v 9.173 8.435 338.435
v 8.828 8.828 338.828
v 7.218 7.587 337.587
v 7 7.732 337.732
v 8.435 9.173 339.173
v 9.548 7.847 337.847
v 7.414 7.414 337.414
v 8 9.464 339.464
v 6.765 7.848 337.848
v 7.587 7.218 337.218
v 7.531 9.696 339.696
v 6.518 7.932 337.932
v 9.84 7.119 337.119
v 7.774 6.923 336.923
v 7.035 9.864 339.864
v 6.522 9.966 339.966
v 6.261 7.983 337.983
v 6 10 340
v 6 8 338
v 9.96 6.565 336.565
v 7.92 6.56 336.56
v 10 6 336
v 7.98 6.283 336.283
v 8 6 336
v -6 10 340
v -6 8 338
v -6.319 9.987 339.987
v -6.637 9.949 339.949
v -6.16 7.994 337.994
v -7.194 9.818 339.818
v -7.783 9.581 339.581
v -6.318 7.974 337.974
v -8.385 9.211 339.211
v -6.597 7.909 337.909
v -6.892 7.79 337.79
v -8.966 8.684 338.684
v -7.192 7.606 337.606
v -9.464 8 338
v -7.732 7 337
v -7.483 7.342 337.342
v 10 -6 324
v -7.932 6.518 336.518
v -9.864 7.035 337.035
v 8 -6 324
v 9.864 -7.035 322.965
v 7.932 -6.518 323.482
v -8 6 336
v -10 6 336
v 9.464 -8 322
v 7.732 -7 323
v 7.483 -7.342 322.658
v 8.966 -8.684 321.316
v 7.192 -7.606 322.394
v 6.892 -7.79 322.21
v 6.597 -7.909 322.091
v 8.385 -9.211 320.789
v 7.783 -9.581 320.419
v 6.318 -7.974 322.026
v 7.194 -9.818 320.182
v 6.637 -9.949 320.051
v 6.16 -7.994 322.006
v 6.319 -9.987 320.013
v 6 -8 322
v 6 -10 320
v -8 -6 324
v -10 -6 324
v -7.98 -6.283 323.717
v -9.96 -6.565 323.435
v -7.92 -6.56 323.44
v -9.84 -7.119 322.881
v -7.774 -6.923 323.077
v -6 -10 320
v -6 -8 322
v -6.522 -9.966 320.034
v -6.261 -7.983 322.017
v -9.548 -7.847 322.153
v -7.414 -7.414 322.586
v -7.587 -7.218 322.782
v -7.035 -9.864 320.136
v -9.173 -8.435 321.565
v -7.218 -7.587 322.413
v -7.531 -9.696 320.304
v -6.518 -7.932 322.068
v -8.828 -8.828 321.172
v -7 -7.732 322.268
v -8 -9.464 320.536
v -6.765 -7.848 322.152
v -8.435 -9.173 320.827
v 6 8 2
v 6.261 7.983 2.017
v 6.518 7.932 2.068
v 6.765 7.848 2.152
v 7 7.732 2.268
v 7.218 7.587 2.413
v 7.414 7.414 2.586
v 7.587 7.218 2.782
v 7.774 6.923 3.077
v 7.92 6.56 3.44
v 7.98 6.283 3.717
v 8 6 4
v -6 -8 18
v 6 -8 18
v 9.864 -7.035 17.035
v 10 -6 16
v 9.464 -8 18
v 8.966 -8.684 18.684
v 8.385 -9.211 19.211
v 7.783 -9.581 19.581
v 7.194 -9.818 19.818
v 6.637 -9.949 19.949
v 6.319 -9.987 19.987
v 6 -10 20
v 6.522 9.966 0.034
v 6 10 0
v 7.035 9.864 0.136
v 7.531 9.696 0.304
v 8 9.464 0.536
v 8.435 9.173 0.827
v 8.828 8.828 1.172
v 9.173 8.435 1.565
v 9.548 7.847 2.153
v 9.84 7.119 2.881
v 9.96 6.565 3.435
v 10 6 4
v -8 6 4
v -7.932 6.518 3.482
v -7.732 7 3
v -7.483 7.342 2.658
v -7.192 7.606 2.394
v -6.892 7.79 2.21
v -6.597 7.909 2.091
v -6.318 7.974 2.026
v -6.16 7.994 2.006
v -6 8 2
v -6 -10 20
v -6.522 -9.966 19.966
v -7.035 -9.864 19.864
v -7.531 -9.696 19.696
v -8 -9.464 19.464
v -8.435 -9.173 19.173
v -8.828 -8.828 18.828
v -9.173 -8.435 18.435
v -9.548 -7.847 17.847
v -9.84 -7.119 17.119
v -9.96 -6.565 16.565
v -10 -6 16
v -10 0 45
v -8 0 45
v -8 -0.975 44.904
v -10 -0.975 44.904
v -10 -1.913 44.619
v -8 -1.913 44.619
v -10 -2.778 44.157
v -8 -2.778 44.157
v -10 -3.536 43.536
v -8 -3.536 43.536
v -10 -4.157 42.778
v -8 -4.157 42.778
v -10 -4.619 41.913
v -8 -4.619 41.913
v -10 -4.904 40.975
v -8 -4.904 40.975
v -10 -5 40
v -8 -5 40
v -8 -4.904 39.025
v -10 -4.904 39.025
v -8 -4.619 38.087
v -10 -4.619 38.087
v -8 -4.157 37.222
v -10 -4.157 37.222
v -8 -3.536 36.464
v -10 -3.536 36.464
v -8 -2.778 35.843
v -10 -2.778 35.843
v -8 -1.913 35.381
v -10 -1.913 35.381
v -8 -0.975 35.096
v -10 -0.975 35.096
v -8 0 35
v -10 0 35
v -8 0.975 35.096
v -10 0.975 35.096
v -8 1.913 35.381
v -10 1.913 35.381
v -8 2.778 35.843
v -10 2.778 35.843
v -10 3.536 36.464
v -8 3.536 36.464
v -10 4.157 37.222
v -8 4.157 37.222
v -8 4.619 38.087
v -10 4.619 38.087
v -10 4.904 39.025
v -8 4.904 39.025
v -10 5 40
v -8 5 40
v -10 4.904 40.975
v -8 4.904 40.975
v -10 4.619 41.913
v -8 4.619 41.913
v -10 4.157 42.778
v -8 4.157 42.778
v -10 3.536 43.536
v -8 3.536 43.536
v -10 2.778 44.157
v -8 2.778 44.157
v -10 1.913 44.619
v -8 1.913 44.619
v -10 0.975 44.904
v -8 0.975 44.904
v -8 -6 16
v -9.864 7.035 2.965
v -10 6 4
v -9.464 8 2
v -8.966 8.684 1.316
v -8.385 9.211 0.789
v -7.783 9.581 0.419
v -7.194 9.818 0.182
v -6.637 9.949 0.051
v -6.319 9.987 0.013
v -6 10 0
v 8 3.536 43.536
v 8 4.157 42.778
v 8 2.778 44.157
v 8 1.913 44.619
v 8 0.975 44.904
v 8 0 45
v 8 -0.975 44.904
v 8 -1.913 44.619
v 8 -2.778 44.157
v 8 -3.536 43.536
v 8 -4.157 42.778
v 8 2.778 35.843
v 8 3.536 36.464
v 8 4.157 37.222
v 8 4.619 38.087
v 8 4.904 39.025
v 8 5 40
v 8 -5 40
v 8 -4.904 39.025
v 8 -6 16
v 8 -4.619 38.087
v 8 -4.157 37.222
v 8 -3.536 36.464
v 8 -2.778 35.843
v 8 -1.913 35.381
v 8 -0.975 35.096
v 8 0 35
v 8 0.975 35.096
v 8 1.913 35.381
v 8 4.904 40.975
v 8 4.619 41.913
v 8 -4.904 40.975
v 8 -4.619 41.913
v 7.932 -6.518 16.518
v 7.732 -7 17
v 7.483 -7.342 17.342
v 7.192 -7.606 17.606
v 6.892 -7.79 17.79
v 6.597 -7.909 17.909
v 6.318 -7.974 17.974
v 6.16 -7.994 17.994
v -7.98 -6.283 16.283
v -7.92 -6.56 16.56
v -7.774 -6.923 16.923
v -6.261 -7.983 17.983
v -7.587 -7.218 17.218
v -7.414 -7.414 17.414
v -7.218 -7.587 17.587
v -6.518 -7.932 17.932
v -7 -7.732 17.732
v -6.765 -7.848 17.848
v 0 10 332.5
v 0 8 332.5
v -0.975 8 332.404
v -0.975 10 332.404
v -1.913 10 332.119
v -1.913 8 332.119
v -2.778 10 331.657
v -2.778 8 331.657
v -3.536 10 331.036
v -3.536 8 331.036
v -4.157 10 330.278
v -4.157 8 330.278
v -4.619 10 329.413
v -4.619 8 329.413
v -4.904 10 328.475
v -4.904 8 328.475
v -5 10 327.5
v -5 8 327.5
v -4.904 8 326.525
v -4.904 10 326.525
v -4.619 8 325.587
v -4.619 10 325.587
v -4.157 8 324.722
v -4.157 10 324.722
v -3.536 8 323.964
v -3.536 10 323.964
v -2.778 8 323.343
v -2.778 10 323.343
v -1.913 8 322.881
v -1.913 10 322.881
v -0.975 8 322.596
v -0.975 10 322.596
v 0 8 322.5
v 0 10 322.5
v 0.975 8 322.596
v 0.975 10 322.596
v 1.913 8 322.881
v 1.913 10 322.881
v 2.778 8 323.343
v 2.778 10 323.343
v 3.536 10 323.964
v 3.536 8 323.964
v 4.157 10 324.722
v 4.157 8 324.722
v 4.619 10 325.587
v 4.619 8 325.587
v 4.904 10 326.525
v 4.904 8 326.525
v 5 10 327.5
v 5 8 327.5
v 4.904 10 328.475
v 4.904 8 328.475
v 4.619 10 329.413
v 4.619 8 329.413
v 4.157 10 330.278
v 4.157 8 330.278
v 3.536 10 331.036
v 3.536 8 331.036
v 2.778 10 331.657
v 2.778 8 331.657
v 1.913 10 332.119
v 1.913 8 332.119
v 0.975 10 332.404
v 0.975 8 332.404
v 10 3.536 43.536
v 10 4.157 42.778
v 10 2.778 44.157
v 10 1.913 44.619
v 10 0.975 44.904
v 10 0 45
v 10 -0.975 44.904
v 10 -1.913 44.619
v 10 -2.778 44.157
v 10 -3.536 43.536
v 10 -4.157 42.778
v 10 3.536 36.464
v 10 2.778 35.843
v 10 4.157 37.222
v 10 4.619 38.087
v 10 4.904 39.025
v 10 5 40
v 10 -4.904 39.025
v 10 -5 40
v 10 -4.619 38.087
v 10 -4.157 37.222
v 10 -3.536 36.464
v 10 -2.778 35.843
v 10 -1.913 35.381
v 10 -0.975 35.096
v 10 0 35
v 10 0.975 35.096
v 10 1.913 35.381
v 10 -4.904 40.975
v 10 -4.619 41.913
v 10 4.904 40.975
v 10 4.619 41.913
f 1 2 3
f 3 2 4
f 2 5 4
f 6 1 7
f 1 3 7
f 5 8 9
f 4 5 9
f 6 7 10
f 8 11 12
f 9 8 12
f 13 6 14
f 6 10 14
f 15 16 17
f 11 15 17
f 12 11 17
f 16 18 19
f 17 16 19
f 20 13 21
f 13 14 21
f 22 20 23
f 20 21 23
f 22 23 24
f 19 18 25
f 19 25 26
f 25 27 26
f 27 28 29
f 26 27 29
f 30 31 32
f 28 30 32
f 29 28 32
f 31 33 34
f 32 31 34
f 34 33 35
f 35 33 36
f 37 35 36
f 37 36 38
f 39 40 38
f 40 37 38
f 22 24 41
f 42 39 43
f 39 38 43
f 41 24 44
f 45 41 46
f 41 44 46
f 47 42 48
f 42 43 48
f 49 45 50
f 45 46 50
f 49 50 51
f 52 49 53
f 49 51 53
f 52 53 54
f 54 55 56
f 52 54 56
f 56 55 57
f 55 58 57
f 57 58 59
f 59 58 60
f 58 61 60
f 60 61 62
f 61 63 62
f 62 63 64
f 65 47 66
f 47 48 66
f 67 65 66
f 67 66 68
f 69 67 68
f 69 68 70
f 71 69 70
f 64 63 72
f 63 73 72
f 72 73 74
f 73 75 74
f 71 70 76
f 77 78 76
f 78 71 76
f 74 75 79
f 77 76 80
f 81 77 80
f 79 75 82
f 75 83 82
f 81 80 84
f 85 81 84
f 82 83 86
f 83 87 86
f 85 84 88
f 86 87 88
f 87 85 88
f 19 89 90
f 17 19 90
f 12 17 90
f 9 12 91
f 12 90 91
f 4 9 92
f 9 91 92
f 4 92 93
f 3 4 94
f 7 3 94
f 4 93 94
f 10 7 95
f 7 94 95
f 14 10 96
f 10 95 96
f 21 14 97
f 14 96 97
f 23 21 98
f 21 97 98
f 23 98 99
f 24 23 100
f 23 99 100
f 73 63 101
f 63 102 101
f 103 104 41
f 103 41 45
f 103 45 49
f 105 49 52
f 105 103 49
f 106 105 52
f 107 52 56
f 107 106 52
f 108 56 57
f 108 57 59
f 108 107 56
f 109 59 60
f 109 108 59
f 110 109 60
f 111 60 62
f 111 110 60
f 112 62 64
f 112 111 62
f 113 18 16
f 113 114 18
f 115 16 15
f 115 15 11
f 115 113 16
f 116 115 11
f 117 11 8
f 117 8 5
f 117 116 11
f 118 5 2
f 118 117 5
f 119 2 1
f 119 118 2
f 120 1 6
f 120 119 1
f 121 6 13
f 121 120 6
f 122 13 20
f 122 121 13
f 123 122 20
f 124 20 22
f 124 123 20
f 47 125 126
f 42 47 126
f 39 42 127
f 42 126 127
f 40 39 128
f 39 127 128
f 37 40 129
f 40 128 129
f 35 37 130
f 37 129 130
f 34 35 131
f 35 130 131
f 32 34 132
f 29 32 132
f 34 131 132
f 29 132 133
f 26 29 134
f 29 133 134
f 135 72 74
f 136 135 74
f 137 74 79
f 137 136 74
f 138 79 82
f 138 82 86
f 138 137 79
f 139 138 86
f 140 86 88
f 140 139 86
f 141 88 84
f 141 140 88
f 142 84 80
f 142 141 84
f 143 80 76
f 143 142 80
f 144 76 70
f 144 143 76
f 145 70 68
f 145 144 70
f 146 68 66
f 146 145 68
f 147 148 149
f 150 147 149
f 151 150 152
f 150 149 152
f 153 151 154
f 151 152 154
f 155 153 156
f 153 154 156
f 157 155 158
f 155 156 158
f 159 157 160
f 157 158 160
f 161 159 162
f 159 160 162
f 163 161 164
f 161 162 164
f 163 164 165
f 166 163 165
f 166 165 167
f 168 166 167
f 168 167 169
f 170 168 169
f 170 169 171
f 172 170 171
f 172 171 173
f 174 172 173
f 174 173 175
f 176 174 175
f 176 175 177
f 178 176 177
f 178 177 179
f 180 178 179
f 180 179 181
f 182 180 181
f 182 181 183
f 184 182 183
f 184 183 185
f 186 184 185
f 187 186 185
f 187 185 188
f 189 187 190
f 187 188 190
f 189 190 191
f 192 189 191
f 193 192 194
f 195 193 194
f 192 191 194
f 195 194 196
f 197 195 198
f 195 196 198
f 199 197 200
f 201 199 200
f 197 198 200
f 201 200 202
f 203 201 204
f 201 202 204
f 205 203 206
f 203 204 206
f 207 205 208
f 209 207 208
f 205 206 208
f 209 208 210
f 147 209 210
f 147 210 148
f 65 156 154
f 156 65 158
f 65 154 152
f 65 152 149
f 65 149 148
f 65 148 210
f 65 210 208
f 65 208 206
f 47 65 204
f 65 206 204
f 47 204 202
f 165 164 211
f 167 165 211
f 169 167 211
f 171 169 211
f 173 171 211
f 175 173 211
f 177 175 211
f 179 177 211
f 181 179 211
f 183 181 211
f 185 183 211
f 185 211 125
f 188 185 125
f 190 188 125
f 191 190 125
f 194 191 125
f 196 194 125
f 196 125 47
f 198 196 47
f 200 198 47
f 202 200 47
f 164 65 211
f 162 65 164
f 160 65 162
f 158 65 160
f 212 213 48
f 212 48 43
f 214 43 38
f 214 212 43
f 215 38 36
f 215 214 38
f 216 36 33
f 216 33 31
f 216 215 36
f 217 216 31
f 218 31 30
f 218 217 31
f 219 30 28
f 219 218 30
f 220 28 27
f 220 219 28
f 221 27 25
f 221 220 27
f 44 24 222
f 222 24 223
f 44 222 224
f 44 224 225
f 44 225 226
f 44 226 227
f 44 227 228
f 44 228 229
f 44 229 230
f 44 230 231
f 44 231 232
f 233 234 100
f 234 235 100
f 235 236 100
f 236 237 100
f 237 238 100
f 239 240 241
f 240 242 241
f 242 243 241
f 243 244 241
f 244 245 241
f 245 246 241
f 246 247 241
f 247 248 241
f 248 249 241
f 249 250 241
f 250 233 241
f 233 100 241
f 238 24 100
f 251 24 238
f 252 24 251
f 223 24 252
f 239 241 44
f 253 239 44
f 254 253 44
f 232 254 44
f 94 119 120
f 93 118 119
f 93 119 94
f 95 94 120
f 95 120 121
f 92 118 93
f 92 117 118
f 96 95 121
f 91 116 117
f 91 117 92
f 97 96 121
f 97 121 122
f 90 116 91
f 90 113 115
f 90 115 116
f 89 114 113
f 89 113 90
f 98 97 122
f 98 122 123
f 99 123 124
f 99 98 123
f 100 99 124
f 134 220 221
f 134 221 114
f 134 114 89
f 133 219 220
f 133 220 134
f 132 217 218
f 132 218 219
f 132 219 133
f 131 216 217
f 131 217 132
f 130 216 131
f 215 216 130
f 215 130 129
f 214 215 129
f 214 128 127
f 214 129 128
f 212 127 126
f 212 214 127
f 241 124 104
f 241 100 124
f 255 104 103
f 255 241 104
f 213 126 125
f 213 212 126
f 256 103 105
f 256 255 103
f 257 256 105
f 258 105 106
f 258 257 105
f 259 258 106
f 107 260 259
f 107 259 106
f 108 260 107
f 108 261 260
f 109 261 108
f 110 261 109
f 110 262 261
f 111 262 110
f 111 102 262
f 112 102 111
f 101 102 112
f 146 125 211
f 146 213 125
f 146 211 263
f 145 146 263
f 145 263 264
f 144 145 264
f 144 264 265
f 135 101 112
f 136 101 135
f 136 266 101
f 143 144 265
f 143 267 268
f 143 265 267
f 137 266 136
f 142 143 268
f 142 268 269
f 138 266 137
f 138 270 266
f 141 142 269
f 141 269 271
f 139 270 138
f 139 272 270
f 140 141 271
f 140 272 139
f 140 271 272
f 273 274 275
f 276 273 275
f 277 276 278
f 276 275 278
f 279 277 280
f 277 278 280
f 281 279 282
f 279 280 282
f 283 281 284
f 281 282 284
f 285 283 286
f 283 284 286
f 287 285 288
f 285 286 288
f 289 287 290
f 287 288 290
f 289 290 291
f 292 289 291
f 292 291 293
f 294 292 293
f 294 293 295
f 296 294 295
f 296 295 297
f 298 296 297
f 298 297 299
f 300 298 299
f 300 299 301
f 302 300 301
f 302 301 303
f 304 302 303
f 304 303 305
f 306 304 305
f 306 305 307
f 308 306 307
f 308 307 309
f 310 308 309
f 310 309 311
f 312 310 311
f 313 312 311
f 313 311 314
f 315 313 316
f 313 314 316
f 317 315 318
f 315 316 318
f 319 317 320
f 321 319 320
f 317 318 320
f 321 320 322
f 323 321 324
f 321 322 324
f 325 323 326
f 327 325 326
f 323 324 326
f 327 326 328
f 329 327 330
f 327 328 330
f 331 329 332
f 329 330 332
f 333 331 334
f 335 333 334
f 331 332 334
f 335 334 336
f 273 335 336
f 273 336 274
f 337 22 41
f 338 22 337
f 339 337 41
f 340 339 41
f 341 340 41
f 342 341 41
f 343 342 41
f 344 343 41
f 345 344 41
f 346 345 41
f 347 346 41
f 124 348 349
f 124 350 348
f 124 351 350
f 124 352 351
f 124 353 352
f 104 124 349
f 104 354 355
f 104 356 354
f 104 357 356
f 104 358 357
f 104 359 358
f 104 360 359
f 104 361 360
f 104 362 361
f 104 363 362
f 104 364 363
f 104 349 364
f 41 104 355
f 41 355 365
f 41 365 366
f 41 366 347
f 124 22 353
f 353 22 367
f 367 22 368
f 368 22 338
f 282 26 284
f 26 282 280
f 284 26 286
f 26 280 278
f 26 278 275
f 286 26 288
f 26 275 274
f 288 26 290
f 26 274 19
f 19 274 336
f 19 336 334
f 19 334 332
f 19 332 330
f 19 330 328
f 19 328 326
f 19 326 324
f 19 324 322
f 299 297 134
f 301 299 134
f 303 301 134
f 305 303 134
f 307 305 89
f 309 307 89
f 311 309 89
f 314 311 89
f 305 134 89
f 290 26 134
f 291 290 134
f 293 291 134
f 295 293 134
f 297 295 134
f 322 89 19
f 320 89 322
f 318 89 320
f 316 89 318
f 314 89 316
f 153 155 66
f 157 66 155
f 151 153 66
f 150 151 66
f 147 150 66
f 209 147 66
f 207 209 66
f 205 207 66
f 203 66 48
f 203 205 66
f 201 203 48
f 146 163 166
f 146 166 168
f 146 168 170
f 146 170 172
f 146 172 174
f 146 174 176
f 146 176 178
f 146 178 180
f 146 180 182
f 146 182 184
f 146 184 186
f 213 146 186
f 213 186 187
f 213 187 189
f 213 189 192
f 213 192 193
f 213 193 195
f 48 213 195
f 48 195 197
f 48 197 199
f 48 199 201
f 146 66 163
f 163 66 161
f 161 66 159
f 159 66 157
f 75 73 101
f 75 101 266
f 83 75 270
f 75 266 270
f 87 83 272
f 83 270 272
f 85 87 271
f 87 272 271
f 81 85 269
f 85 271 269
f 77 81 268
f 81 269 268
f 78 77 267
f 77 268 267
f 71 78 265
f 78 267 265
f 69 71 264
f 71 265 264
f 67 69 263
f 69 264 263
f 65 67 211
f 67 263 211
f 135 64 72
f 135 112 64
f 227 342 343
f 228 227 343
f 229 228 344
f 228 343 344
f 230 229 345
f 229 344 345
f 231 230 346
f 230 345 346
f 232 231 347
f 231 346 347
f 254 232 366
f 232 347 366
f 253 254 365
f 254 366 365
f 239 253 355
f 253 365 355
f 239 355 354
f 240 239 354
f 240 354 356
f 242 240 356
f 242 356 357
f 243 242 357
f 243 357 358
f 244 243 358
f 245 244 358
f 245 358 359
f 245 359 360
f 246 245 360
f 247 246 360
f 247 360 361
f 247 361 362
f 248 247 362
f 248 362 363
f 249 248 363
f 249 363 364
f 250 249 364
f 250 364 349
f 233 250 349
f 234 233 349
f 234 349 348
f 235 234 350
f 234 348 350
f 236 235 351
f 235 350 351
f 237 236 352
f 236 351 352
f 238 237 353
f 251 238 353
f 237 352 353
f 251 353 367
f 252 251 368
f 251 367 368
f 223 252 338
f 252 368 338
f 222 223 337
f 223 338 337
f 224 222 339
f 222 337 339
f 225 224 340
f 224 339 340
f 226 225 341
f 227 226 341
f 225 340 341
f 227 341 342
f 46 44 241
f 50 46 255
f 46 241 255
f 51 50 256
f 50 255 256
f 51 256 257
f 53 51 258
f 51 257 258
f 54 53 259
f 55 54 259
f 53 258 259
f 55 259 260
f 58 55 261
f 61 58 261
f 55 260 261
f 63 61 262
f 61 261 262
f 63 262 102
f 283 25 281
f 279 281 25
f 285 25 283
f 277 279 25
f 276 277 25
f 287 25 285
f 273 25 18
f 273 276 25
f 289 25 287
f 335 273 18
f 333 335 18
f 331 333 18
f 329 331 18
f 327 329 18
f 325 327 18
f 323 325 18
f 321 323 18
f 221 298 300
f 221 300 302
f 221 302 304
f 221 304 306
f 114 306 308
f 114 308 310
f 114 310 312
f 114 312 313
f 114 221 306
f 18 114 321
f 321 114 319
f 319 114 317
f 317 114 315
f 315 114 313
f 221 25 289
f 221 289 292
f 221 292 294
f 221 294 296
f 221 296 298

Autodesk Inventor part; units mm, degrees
ref_plane "YZ Plane" through (0, 0, 0) normal (1, 0, 0) x (0, 1, 0)
ref_plane "Piano iniziale" through (0, 0, 0) normal (0, 0, 1) x (1, 0, 0)
ref_plane "Piano finale" through (0, 0, 340) normal (0, 0, 1) x (1, 0, 0)
sketch "Schizzo" plane through (0, 0, 0) normal (0, 0, 1) x (1, 0, 0)
  line L0 (-10, -6) -> (-10, 6)
  line L1 (-6, 10) -> (6, 10)
  line L2 (10, 6) -> (10, -6)
  line L3 (6, -10) -> (-6, -10)
  arc A0 (-10, -6) -> (-6, -10) centre (-6, -6) ccw
  arc A1 (10, 6) -> (6, 10) centre (6, 6) ccw
  arc A2 (-6, 10) -> (-10, 6) centre (-6, 6) ccw
  arc A3 (6, -10) -> (10, -6) centre (6, -6) ccw
  arc A4 (-6, 8) -> (-8, 6) centre (-6, 6) ccw
  line L4 (-6, 8) -> (6, 8)
  arc A5 (8, 6) -> (6, 8) centre (6, 6) ccw
  line L5 (8, 6) -> (8, -6)
  arc A6 (6, -8) -> (8, -6) centre (6, -6) ccw
  line L6 (6, -8) -> (-6, -8)
  arc A7 (-8, -6) -> (-6, -8) centre (-6, -6) ccw
  line L7 (-8, -6) -> (-8, 6)
  line L8 (0, 15.1598) -> (0, -15.1598) construction
  line L9 (-15.1598, 0) -> (15.1598, 0) construction
  dimension "d7" = 4
  dimension "d9" = 20
  dimension "d11" = 20
  dimension "d12" = 2
  dimension "d15" = 10
  dimension "d16" = 10
extrude "Corpo" add sketch "Schizzo" along normal up to surface (340 mm away) from surface at 0
sketch "Sketch3" plane through (0, 0, 0) normal (0, 0, 1) x (1, 0, 0)
  line L0 (0, 0) -> (10, 0)
ref_plane "Work Plane3" through (0, 0, 0) normal (0, -1, 0) x (1, 0, 0)
sketch "Sketch4" plane through (0, 0, 0) normal (0, -1, 0) x (1, 0, 0)
  line L0 (-2, 0) -> (12, 0)
  line L1 (-2, 340) -> (12, 340)
  dimension "d18" = 340
sketch "Schizzo5" plane through (-10, 6, 0) normal (-1, 0, 0) x (0, 0, 1)
  line L0 (0, 4) -> (0, 0) projected
  line L1 (0, 4) -> (28.5929, -24.5929)
  line L2 (0, 4) -> (40.4365, 4) construction
  line L3 (28.5929, -24.5929) -> (0, -24.5929)
  line L4 (0, -24.5929) -> (0, 4)
  line L5 (340, 4) -> (340, 0) projected
  line L6 (340, 4) -> (307.9608, -28.0392)
  line L7 (340, 4) -> (385.3103, 4) construction
  line L8 (307.9608, -28.0392) -> (340, -28.0392)
  line L9 (340, -28.0392) -> (340, 4)
  line L10 (340, 0) -> (340, -12) projected
  point P0 (0, -6)
  dimension "d19" = 45
  dimension "d20" = 135
extrude "Estrusione2" cut sketch "Schizzo5" against normal up to next
sketch "Schizzo6" plane through (6, 10, 340) normal (0, 1, 0) x (1, 0, 0)
  line L0 (-12, 0) -> (0, 0) projected
  point P0 (-6, 340)
  point P1 (-6, 12.5)
  point P2 (-6, 0)
  dimension "d23" = 12.5
hole "Foro1" at (0, 10, 327.5) direction (0, -1, 0) diameter 10 depth 5 tip angle 118
sketch "Schizzo7" plane through (-10, 6, 4) normal (-1, 0, 0) x (0, 0, 1)
  point P0 (-4, -6)
  point P1 (36, -6)
  dimension "d31" = 40
hole "Foro2" at (-10, 0, 40) direction (1, 0, 0) diameter 10 end through all
equation "\"d7\" = G_IR"
equation "\"d9\" = G_W"
equation "\"d11\" = G_H"
equation "\"d12\" = G_T"
equation "\"d15\" = 0.5 * d9"
equation "\"d16\" = 0.5 * d11"
equation "\"d3\" = G_L"
equation "\"G_W\" = 20"
equation "\"G_H\" = 20"
equation "\"G_T\" = 2"
equation "\"G_IR\" = 4"
equation "\"G_L\" = d18"
equation "\"G_OFFSET_START\" = 0"
equation "\"G_OFFSET_END\" = 0"
properties part number "ISO 10799-2 - 20x20x2 - 340" material "Acciaio, Dolce"
